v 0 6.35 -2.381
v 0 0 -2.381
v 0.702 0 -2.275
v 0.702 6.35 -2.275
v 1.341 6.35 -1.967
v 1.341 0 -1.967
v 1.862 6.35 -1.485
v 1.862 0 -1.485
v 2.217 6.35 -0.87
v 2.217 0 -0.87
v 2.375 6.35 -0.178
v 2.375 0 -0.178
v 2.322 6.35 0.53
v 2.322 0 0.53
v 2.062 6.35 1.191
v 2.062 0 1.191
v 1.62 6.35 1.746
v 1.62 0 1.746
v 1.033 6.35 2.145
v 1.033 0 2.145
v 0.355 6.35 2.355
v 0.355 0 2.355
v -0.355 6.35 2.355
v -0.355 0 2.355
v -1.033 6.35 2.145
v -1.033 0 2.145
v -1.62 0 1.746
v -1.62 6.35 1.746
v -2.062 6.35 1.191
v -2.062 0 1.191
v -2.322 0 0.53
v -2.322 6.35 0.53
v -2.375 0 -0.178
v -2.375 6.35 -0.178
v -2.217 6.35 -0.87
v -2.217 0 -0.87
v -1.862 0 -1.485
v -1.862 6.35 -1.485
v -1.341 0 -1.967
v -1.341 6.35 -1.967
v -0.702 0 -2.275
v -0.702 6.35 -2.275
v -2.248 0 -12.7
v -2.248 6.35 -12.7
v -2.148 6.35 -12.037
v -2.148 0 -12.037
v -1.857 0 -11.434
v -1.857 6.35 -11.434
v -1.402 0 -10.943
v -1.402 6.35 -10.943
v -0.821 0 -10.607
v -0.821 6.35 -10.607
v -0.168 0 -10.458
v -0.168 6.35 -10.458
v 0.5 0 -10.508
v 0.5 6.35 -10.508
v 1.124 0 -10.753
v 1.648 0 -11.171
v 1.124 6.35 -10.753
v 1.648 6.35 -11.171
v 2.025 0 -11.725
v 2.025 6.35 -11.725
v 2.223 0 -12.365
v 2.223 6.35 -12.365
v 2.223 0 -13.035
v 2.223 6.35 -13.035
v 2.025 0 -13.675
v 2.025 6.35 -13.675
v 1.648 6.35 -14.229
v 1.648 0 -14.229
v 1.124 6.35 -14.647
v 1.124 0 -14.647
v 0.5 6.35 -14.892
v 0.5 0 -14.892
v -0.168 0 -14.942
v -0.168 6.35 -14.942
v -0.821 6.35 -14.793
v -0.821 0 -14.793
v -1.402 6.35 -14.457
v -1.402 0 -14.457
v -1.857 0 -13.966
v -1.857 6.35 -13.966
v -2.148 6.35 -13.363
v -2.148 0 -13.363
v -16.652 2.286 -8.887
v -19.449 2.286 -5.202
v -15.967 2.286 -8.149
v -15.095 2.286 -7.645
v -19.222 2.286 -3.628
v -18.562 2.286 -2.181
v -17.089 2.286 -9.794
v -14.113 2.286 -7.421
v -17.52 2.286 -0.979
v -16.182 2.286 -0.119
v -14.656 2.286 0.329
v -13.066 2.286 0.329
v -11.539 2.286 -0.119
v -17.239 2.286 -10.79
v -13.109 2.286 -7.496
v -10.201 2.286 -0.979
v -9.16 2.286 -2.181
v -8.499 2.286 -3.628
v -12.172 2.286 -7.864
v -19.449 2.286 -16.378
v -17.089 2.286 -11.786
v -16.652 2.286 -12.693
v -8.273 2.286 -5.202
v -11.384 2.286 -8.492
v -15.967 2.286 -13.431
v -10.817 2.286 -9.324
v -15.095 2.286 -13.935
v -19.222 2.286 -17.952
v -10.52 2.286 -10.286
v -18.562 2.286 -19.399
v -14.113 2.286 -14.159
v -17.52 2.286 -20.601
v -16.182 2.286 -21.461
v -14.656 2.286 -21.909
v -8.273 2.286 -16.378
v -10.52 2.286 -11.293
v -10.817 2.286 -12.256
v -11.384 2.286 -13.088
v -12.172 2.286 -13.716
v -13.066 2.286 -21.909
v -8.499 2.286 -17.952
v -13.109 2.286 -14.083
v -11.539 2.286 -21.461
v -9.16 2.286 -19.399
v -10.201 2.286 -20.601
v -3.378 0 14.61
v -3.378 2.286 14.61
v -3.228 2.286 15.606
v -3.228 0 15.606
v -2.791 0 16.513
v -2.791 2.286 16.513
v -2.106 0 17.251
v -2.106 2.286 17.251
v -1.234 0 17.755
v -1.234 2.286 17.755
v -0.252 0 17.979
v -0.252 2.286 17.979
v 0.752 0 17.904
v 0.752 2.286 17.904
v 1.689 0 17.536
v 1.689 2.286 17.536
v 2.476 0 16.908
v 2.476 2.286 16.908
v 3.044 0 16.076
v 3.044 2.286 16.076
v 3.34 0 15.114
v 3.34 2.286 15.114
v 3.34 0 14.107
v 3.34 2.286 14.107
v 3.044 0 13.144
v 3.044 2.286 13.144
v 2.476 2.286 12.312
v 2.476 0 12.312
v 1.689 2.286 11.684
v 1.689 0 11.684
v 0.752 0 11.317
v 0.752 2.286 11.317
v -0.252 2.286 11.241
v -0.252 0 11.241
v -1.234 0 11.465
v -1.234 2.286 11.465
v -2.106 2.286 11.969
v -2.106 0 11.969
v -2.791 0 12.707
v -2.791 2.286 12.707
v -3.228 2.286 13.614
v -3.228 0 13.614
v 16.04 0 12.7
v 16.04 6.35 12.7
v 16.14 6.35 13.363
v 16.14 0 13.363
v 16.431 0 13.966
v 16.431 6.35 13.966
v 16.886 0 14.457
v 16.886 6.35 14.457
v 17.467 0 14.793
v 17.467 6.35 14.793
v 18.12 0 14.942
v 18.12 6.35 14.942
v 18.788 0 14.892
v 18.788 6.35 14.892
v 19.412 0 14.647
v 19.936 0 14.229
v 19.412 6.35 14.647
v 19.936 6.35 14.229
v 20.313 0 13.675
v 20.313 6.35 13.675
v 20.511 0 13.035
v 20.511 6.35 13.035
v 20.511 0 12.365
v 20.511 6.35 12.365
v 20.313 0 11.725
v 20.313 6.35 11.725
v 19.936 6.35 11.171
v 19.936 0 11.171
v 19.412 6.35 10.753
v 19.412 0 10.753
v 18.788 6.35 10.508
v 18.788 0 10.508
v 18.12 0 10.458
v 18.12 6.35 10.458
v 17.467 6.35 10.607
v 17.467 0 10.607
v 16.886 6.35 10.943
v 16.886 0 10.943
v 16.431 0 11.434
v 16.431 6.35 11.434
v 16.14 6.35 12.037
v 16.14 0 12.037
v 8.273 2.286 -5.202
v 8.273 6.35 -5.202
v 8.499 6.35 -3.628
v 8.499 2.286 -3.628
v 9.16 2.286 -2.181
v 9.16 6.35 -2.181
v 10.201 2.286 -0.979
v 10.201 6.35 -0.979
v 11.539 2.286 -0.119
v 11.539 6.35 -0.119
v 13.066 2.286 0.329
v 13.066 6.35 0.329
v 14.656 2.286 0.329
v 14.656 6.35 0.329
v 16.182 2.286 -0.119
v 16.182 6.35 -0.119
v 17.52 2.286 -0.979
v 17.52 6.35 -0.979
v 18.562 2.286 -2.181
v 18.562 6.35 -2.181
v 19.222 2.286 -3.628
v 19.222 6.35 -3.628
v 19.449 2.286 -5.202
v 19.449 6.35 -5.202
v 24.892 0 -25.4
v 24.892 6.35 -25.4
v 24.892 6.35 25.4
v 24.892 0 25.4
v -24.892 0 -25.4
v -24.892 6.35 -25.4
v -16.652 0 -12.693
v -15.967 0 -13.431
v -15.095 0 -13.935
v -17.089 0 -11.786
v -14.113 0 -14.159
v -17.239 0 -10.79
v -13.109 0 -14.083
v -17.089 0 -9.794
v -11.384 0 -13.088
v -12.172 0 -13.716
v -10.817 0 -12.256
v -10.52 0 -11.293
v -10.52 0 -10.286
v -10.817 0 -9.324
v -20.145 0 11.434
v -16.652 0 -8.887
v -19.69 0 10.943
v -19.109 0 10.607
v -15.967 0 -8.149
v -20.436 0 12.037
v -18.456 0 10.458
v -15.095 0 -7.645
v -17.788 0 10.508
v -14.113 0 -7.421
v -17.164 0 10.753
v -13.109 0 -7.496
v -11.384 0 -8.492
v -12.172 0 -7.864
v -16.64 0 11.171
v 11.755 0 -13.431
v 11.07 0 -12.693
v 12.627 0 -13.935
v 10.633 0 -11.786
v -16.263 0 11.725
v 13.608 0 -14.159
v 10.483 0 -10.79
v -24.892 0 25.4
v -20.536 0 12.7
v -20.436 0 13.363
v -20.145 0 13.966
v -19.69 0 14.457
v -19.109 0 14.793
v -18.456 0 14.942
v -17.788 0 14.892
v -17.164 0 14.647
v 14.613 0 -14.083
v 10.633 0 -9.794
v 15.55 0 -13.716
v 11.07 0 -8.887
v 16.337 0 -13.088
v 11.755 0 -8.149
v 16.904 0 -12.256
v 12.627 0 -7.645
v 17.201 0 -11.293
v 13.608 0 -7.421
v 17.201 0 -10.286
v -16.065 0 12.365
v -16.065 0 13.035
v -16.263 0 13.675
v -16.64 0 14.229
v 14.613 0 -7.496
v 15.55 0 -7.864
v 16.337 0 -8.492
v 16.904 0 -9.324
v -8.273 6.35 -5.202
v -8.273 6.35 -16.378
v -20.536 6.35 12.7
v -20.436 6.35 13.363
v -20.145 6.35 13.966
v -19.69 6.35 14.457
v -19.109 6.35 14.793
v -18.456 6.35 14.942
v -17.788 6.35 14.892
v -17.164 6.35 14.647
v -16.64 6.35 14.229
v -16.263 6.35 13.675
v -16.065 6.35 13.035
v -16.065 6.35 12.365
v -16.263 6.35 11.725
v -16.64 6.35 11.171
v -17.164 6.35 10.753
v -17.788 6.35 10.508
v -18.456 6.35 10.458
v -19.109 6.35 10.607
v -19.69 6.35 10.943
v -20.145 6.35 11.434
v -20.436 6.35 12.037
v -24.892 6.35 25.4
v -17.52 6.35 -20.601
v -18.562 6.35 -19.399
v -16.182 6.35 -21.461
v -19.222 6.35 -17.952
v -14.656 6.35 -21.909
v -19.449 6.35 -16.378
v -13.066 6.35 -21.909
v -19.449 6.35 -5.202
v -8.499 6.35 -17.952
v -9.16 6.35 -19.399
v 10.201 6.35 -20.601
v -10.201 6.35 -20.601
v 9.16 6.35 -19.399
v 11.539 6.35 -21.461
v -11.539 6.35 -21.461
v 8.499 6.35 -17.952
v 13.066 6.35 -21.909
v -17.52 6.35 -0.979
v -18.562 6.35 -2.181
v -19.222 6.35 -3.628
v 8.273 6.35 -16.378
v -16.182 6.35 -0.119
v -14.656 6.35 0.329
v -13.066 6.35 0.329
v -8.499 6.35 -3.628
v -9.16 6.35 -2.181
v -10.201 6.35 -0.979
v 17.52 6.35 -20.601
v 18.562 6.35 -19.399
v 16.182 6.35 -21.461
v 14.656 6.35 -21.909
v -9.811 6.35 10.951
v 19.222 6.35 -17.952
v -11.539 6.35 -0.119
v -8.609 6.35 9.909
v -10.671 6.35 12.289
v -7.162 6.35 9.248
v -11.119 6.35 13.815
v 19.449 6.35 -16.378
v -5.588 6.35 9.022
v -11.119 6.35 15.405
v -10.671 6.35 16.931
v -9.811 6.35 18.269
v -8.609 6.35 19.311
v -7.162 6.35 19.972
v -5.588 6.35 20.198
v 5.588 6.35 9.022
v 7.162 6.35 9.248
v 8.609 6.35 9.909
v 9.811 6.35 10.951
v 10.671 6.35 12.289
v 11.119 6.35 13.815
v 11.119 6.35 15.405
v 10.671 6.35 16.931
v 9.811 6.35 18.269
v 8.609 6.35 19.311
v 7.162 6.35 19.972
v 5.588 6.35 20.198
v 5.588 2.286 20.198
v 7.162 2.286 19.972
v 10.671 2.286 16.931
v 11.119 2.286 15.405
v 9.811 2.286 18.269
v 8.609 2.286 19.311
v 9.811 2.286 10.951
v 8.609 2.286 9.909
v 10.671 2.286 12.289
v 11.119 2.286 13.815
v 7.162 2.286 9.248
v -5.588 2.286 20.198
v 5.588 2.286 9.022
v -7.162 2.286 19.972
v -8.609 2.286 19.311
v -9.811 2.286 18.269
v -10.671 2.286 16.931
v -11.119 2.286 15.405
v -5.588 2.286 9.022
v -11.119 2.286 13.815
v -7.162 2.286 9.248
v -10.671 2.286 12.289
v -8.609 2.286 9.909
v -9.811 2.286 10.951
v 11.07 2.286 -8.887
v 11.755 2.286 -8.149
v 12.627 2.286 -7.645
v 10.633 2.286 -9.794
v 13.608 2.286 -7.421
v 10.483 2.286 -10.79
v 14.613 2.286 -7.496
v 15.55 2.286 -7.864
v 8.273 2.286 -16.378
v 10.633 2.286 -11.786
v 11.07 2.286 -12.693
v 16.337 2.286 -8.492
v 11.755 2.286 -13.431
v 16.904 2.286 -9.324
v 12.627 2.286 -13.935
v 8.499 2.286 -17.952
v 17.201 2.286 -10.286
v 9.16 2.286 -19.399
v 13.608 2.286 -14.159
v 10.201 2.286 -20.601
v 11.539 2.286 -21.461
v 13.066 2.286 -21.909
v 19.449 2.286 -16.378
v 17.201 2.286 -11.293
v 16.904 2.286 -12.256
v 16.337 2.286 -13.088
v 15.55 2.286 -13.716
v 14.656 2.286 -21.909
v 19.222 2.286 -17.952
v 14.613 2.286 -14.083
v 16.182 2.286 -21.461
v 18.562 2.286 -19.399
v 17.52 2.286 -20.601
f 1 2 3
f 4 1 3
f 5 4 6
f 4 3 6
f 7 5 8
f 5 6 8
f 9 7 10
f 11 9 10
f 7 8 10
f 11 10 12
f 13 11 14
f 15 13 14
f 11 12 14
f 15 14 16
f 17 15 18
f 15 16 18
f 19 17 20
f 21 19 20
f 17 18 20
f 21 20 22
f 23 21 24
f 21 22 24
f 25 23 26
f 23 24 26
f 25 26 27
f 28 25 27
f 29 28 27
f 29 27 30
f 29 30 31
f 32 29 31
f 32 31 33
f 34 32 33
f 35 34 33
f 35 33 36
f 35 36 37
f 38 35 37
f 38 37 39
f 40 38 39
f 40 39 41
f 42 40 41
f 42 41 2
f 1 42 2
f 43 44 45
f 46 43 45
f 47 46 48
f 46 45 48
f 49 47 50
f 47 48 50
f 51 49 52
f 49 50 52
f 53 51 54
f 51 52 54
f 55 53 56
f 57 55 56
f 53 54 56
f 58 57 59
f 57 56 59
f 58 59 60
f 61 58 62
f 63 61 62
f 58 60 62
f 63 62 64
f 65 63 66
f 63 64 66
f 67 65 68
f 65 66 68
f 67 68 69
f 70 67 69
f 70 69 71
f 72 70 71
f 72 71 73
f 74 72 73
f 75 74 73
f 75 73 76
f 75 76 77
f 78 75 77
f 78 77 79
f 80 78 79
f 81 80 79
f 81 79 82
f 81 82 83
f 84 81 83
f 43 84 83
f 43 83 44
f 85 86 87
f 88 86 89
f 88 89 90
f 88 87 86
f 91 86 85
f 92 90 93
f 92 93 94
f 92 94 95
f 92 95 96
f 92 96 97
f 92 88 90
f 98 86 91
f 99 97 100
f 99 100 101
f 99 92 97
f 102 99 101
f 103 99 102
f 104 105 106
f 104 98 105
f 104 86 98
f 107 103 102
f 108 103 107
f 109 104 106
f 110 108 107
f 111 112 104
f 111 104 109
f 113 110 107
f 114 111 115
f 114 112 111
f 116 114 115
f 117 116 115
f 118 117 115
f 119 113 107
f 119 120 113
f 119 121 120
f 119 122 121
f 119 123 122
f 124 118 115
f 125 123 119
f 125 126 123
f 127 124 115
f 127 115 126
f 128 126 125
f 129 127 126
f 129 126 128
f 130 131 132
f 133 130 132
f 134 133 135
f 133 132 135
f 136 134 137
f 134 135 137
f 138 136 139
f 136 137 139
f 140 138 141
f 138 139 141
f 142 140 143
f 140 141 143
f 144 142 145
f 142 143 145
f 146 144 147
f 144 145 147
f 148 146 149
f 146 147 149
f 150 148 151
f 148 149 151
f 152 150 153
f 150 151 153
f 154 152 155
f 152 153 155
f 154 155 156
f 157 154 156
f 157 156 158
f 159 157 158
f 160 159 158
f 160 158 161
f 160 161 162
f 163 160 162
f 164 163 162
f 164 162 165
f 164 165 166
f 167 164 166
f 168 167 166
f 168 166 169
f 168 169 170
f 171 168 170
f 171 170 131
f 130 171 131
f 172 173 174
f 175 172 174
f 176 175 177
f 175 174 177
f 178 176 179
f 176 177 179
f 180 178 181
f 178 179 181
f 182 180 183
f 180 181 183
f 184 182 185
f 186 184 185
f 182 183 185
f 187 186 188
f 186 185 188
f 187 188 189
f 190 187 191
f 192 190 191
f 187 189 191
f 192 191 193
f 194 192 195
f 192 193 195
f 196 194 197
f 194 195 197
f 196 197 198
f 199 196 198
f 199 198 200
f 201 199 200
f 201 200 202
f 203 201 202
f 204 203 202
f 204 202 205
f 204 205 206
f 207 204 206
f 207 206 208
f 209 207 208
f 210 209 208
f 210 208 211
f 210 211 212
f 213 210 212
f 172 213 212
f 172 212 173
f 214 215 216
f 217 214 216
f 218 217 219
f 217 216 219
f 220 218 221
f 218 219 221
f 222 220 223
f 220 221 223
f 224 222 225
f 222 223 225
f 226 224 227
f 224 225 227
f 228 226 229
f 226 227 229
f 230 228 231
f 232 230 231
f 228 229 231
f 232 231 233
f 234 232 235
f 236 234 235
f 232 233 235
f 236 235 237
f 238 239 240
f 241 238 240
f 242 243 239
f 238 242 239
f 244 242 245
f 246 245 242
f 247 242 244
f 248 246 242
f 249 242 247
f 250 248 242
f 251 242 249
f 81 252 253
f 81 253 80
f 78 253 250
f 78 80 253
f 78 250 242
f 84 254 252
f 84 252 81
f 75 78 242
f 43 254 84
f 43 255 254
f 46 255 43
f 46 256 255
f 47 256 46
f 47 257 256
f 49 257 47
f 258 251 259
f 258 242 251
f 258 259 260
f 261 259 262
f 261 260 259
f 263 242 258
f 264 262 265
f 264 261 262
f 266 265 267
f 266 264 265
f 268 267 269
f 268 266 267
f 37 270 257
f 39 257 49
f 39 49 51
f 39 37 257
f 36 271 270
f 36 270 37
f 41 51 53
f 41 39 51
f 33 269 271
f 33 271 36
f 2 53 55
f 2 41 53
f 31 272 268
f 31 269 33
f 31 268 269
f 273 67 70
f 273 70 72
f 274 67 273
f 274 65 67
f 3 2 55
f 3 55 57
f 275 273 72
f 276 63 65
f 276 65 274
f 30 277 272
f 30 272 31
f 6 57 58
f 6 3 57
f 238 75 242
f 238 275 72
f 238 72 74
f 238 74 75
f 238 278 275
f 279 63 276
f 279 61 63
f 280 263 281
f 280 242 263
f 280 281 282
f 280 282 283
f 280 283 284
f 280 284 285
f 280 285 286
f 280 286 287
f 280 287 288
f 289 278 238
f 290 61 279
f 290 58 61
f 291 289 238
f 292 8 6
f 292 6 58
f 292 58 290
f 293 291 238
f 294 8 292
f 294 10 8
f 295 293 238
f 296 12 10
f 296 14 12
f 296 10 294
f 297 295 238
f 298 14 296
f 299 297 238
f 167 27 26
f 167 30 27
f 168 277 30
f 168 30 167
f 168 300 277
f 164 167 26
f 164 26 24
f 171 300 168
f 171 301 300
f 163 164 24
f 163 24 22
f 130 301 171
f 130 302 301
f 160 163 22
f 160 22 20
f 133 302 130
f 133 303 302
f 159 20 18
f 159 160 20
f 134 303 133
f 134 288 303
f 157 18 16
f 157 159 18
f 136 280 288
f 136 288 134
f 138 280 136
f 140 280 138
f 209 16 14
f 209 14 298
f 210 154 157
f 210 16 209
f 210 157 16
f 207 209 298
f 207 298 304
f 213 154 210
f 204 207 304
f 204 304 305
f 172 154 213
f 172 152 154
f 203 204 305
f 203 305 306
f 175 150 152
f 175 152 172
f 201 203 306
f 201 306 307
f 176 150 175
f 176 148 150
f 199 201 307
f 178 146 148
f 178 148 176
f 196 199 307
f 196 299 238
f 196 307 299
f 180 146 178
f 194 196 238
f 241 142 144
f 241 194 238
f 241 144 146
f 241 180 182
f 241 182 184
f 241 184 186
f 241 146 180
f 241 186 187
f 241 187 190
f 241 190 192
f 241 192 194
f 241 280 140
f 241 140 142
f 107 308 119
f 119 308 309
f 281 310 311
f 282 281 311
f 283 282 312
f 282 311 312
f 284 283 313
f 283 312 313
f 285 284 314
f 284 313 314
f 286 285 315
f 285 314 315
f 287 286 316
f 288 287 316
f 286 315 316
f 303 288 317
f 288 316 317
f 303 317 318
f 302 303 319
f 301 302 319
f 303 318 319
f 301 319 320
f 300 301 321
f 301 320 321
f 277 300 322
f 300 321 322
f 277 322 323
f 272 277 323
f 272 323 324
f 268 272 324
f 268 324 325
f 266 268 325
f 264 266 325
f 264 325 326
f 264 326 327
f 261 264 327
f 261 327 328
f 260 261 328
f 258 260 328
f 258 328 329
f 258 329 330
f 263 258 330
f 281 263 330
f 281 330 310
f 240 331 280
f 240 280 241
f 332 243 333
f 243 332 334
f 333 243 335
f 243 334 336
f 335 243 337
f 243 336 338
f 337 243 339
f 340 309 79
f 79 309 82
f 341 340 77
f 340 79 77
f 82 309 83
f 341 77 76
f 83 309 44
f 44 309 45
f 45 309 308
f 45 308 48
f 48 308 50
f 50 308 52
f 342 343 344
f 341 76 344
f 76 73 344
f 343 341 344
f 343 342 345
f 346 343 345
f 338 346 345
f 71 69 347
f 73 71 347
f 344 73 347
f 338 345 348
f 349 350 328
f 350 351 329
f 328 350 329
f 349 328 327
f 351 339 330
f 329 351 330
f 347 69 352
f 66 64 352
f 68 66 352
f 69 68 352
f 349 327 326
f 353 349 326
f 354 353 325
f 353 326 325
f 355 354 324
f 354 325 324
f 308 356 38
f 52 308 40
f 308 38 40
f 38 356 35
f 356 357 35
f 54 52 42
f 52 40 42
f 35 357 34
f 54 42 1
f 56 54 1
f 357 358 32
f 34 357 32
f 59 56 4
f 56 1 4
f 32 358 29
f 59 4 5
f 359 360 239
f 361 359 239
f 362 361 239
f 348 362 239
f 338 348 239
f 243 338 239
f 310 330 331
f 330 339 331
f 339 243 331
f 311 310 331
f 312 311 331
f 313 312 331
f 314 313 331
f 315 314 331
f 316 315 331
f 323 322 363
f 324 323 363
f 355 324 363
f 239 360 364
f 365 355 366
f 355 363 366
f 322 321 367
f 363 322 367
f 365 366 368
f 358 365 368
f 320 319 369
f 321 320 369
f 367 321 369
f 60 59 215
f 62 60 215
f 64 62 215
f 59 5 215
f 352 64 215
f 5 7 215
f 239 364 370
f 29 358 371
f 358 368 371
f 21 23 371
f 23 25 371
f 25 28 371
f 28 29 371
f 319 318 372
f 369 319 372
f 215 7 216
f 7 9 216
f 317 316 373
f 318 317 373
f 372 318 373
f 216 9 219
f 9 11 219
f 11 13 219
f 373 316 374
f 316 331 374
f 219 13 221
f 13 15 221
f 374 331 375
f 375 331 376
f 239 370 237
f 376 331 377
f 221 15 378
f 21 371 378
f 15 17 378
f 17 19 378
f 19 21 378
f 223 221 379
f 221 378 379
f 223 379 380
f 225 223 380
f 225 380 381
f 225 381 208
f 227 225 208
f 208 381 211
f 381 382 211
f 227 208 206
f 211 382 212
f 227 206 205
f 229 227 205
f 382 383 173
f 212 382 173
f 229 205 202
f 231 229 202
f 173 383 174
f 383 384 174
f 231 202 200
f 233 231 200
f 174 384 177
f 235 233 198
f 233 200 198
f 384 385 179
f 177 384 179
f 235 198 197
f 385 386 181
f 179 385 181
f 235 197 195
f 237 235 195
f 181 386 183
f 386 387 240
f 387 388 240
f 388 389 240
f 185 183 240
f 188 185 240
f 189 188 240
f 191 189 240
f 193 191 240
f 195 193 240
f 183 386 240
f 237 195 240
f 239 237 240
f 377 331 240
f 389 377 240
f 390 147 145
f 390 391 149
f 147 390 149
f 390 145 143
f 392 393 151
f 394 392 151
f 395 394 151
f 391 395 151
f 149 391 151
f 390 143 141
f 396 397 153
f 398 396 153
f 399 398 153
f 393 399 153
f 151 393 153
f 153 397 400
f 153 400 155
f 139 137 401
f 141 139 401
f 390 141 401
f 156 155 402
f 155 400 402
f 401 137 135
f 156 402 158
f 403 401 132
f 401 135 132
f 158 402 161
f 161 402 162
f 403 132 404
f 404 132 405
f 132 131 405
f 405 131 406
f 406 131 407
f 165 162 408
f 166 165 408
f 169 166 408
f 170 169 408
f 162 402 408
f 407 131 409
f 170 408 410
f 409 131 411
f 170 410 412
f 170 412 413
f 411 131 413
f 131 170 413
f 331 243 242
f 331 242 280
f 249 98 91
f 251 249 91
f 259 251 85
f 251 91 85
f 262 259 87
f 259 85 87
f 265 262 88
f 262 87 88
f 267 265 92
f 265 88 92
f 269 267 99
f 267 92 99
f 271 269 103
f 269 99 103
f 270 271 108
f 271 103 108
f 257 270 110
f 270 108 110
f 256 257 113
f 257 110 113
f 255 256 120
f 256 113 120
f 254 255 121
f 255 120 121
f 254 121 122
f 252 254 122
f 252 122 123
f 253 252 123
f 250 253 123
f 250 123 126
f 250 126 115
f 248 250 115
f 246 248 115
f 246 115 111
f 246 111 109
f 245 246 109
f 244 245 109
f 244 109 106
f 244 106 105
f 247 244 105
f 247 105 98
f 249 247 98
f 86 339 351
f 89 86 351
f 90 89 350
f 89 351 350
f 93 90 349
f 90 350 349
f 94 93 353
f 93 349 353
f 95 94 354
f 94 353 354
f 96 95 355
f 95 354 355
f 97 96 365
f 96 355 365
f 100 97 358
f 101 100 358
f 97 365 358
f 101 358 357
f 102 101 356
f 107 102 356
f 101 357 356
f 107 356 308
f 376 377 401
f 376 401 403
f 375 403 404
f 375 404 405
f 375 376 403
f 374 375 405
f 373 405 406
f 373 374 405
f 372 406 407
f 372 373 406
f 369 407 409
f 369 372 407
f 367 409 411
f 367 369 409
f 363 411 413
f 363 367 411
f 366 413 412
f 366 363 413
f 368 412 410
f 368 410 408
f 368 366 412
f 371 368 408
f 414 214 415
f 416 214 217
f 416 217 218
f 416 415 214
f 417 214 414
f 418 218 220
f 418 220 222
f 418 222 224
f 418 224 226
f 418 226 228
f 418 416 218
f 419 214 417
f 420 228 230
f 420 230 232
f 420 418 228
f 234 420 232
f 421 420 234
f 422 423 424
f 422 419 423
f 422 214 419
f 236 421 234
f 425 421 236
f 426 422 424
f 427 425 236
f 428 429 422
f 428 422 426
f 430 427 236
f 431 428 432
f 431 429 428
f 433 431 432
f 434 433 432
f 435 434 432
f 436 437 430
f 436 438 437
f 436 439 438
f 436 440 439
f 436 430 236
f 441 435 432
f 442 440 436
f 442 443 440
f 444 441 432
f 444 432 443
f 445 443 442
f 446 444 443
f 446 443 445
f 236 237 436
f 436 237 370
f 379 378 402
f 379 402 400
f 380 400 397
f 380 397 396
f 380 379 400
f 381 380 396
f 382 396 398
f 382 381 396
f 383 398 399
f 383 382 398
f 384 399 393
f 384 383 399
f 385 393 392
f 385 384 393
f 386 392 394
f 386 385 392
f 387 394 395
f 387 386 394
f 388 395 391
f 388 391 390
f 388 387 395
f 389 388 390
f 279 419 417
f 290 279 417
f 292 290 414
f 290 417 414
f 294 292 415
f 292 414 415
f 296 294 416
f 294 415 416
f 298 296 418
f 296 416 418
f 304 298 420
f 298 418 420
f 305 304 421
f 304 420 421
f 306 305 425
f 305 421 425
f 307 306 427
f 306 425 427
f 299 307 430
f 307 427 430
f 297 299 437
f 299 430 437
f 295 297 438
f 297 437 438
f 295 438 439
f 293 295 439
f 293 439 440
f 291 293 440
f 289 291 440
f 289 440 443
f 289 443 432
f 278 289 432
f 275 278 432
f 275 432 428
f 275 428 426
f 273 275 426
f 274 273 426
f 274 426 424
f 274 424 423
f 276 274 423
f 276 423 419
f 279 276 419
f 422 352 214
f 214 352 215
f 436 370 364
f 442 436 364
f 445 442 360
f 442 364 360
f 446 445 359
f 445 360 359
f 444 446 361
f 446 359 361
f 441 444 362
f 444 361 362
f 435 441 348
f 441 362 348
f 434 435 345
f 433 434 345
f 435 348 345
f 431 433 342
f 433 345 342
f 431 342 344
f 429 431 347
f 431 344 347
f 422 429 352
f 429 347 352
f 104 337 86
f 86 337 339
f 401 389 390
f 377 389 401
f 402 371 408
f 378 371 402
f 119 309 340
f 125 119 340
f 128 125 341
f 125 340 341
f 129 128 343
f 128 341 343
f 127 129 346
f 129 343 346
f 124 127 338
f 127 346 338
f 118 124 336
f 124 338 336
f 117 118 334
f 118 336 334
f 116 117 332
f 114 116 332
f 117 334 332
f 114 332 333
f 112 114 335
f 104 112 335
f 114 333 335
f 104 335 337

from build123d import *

# Parameters (mm, degrees)
SKETCH1_W               = 49.784
SKETCH1_H               = 50.8
BOSS_EXTRUDE1_DEPTH     = 6.35
F_8_CLEARANCE_HOLE1_D   = 4.4958
F_1_4_CLEARANCE_HOLE1_D = 6.7564
CUT_EXTRUDE1_DEPTH      = 4.064
SKETCH9_R               = 2.38125
CUT_EXTRUDE2_DEPTH      = 37.126087029
BODY_MOVE_COPY1_ANGLE   = 180


with BuildPart() as part:
    # Sketch1 → Boss-Extrude1 (new body)
    with BuildSketch(Plane(origin=(0, 0, 0), x_dir=(1, 0, 0), z_dir=(0, 1, 0))):
        Rectangle(SKETCH1_W, SKETCH1_H)
    extrude(amount=BOSS_EXTRUDE1_DEPTH)

    # #8 Clearance Hole1 (through all)
    with Locations(Plane(origin=(0, 6.35, 0), x_dir=(1, 0, 0), z_dir=(0, 1, 0))):
        with Locations((-18.288, 12.7), (18.288, 12.7), (0, -12.7)):
            Hole(F_8_CLEARANCE_HOLE1_D / 2)

    # 1/4 Clearance Hole1 (through all)
    with Locations(Plane(origin=(0, 6.35, 0), x_dir=(1, 0, 0), z_dir=(0, 1, 0))):
        with Locations((0, 14.61008), (-13.86078, -10.78992), (13.86078, -10.78992)):
            Hole(F_1_4_CLEARANCE_HOLE1_D / 2)

    # Sketch8 → Cut-Extrude1 (cut)
    with BuildSketch(Plane.XZ):
        with BuildLine():
            Line((-19.44878, 16.37792), (-19.44878, 5.20192))
            ThreePointArc((-19.44878, 5.20192), (-13.86078, -0.38608), (-8.27278, 5.20192))
            Line((-8.27278, 5.20192), (-8.27278, 16.37792))
            ThreePointArc((-8.27278, 16.37792), (-13.86078, 21.96592), (-19.44878, 16.37792))
        make_face()
        with BuildLine():
            Line((8.27278, 16.37792), (8.27278, 5.20192))
            ThreePointArc((8.27278, 5.20192), (13.86078, -0.38608), (19.44878, 5.20192))
            Line((19.44878, 5.20192), (19.44878, 16.37792))
            ThreePointArc((19.44878, 16.37792), (13.86078, 21.96592), (8.27278, 16.37792))
        make_face()
        with BuildLine():
            Line((-5.588, -9.02208), (5.588, -9.02208))
            ThreePointArc((5.588, -9.02208), (11.176, -14.61008), (5.588, -20.19808))
            Line((5.588, -20.19808), (-5.588, -20.19808))
            ThreePointArc((-5.588, -20.19808), (-11.176, -14.61008), (-5.588, -9.02208))
        make_face()
    extrude(amount=-CUT_EXTRUDE1_DEPTH, mode=Mode.SUBTRACT)

    # Sketch9 → Cut-Extrude2 (cut, through all)
    with BuildSketch(Plane(origin=(0, 6.35, 0), x_dir=(1, 0, 0), z_dir=(0, 1, 0))):
        with Locations(Location((0, 0, 0), (0, 0, 270))):
            Circle(SKETCH9_R)
    extrude(amount=-CUT_EXTRUDE2_DEPTH, mode=Mode.SUBTRACT)


with BuildPart() as part_1:
    # Body-Move/Copy1: moved
    add(part.part.rotate(Axis((0, 3.175, 0), (1, 0, 0)), BODY_MOVE_COPY1_ANGLE))


solid = part_1.part
